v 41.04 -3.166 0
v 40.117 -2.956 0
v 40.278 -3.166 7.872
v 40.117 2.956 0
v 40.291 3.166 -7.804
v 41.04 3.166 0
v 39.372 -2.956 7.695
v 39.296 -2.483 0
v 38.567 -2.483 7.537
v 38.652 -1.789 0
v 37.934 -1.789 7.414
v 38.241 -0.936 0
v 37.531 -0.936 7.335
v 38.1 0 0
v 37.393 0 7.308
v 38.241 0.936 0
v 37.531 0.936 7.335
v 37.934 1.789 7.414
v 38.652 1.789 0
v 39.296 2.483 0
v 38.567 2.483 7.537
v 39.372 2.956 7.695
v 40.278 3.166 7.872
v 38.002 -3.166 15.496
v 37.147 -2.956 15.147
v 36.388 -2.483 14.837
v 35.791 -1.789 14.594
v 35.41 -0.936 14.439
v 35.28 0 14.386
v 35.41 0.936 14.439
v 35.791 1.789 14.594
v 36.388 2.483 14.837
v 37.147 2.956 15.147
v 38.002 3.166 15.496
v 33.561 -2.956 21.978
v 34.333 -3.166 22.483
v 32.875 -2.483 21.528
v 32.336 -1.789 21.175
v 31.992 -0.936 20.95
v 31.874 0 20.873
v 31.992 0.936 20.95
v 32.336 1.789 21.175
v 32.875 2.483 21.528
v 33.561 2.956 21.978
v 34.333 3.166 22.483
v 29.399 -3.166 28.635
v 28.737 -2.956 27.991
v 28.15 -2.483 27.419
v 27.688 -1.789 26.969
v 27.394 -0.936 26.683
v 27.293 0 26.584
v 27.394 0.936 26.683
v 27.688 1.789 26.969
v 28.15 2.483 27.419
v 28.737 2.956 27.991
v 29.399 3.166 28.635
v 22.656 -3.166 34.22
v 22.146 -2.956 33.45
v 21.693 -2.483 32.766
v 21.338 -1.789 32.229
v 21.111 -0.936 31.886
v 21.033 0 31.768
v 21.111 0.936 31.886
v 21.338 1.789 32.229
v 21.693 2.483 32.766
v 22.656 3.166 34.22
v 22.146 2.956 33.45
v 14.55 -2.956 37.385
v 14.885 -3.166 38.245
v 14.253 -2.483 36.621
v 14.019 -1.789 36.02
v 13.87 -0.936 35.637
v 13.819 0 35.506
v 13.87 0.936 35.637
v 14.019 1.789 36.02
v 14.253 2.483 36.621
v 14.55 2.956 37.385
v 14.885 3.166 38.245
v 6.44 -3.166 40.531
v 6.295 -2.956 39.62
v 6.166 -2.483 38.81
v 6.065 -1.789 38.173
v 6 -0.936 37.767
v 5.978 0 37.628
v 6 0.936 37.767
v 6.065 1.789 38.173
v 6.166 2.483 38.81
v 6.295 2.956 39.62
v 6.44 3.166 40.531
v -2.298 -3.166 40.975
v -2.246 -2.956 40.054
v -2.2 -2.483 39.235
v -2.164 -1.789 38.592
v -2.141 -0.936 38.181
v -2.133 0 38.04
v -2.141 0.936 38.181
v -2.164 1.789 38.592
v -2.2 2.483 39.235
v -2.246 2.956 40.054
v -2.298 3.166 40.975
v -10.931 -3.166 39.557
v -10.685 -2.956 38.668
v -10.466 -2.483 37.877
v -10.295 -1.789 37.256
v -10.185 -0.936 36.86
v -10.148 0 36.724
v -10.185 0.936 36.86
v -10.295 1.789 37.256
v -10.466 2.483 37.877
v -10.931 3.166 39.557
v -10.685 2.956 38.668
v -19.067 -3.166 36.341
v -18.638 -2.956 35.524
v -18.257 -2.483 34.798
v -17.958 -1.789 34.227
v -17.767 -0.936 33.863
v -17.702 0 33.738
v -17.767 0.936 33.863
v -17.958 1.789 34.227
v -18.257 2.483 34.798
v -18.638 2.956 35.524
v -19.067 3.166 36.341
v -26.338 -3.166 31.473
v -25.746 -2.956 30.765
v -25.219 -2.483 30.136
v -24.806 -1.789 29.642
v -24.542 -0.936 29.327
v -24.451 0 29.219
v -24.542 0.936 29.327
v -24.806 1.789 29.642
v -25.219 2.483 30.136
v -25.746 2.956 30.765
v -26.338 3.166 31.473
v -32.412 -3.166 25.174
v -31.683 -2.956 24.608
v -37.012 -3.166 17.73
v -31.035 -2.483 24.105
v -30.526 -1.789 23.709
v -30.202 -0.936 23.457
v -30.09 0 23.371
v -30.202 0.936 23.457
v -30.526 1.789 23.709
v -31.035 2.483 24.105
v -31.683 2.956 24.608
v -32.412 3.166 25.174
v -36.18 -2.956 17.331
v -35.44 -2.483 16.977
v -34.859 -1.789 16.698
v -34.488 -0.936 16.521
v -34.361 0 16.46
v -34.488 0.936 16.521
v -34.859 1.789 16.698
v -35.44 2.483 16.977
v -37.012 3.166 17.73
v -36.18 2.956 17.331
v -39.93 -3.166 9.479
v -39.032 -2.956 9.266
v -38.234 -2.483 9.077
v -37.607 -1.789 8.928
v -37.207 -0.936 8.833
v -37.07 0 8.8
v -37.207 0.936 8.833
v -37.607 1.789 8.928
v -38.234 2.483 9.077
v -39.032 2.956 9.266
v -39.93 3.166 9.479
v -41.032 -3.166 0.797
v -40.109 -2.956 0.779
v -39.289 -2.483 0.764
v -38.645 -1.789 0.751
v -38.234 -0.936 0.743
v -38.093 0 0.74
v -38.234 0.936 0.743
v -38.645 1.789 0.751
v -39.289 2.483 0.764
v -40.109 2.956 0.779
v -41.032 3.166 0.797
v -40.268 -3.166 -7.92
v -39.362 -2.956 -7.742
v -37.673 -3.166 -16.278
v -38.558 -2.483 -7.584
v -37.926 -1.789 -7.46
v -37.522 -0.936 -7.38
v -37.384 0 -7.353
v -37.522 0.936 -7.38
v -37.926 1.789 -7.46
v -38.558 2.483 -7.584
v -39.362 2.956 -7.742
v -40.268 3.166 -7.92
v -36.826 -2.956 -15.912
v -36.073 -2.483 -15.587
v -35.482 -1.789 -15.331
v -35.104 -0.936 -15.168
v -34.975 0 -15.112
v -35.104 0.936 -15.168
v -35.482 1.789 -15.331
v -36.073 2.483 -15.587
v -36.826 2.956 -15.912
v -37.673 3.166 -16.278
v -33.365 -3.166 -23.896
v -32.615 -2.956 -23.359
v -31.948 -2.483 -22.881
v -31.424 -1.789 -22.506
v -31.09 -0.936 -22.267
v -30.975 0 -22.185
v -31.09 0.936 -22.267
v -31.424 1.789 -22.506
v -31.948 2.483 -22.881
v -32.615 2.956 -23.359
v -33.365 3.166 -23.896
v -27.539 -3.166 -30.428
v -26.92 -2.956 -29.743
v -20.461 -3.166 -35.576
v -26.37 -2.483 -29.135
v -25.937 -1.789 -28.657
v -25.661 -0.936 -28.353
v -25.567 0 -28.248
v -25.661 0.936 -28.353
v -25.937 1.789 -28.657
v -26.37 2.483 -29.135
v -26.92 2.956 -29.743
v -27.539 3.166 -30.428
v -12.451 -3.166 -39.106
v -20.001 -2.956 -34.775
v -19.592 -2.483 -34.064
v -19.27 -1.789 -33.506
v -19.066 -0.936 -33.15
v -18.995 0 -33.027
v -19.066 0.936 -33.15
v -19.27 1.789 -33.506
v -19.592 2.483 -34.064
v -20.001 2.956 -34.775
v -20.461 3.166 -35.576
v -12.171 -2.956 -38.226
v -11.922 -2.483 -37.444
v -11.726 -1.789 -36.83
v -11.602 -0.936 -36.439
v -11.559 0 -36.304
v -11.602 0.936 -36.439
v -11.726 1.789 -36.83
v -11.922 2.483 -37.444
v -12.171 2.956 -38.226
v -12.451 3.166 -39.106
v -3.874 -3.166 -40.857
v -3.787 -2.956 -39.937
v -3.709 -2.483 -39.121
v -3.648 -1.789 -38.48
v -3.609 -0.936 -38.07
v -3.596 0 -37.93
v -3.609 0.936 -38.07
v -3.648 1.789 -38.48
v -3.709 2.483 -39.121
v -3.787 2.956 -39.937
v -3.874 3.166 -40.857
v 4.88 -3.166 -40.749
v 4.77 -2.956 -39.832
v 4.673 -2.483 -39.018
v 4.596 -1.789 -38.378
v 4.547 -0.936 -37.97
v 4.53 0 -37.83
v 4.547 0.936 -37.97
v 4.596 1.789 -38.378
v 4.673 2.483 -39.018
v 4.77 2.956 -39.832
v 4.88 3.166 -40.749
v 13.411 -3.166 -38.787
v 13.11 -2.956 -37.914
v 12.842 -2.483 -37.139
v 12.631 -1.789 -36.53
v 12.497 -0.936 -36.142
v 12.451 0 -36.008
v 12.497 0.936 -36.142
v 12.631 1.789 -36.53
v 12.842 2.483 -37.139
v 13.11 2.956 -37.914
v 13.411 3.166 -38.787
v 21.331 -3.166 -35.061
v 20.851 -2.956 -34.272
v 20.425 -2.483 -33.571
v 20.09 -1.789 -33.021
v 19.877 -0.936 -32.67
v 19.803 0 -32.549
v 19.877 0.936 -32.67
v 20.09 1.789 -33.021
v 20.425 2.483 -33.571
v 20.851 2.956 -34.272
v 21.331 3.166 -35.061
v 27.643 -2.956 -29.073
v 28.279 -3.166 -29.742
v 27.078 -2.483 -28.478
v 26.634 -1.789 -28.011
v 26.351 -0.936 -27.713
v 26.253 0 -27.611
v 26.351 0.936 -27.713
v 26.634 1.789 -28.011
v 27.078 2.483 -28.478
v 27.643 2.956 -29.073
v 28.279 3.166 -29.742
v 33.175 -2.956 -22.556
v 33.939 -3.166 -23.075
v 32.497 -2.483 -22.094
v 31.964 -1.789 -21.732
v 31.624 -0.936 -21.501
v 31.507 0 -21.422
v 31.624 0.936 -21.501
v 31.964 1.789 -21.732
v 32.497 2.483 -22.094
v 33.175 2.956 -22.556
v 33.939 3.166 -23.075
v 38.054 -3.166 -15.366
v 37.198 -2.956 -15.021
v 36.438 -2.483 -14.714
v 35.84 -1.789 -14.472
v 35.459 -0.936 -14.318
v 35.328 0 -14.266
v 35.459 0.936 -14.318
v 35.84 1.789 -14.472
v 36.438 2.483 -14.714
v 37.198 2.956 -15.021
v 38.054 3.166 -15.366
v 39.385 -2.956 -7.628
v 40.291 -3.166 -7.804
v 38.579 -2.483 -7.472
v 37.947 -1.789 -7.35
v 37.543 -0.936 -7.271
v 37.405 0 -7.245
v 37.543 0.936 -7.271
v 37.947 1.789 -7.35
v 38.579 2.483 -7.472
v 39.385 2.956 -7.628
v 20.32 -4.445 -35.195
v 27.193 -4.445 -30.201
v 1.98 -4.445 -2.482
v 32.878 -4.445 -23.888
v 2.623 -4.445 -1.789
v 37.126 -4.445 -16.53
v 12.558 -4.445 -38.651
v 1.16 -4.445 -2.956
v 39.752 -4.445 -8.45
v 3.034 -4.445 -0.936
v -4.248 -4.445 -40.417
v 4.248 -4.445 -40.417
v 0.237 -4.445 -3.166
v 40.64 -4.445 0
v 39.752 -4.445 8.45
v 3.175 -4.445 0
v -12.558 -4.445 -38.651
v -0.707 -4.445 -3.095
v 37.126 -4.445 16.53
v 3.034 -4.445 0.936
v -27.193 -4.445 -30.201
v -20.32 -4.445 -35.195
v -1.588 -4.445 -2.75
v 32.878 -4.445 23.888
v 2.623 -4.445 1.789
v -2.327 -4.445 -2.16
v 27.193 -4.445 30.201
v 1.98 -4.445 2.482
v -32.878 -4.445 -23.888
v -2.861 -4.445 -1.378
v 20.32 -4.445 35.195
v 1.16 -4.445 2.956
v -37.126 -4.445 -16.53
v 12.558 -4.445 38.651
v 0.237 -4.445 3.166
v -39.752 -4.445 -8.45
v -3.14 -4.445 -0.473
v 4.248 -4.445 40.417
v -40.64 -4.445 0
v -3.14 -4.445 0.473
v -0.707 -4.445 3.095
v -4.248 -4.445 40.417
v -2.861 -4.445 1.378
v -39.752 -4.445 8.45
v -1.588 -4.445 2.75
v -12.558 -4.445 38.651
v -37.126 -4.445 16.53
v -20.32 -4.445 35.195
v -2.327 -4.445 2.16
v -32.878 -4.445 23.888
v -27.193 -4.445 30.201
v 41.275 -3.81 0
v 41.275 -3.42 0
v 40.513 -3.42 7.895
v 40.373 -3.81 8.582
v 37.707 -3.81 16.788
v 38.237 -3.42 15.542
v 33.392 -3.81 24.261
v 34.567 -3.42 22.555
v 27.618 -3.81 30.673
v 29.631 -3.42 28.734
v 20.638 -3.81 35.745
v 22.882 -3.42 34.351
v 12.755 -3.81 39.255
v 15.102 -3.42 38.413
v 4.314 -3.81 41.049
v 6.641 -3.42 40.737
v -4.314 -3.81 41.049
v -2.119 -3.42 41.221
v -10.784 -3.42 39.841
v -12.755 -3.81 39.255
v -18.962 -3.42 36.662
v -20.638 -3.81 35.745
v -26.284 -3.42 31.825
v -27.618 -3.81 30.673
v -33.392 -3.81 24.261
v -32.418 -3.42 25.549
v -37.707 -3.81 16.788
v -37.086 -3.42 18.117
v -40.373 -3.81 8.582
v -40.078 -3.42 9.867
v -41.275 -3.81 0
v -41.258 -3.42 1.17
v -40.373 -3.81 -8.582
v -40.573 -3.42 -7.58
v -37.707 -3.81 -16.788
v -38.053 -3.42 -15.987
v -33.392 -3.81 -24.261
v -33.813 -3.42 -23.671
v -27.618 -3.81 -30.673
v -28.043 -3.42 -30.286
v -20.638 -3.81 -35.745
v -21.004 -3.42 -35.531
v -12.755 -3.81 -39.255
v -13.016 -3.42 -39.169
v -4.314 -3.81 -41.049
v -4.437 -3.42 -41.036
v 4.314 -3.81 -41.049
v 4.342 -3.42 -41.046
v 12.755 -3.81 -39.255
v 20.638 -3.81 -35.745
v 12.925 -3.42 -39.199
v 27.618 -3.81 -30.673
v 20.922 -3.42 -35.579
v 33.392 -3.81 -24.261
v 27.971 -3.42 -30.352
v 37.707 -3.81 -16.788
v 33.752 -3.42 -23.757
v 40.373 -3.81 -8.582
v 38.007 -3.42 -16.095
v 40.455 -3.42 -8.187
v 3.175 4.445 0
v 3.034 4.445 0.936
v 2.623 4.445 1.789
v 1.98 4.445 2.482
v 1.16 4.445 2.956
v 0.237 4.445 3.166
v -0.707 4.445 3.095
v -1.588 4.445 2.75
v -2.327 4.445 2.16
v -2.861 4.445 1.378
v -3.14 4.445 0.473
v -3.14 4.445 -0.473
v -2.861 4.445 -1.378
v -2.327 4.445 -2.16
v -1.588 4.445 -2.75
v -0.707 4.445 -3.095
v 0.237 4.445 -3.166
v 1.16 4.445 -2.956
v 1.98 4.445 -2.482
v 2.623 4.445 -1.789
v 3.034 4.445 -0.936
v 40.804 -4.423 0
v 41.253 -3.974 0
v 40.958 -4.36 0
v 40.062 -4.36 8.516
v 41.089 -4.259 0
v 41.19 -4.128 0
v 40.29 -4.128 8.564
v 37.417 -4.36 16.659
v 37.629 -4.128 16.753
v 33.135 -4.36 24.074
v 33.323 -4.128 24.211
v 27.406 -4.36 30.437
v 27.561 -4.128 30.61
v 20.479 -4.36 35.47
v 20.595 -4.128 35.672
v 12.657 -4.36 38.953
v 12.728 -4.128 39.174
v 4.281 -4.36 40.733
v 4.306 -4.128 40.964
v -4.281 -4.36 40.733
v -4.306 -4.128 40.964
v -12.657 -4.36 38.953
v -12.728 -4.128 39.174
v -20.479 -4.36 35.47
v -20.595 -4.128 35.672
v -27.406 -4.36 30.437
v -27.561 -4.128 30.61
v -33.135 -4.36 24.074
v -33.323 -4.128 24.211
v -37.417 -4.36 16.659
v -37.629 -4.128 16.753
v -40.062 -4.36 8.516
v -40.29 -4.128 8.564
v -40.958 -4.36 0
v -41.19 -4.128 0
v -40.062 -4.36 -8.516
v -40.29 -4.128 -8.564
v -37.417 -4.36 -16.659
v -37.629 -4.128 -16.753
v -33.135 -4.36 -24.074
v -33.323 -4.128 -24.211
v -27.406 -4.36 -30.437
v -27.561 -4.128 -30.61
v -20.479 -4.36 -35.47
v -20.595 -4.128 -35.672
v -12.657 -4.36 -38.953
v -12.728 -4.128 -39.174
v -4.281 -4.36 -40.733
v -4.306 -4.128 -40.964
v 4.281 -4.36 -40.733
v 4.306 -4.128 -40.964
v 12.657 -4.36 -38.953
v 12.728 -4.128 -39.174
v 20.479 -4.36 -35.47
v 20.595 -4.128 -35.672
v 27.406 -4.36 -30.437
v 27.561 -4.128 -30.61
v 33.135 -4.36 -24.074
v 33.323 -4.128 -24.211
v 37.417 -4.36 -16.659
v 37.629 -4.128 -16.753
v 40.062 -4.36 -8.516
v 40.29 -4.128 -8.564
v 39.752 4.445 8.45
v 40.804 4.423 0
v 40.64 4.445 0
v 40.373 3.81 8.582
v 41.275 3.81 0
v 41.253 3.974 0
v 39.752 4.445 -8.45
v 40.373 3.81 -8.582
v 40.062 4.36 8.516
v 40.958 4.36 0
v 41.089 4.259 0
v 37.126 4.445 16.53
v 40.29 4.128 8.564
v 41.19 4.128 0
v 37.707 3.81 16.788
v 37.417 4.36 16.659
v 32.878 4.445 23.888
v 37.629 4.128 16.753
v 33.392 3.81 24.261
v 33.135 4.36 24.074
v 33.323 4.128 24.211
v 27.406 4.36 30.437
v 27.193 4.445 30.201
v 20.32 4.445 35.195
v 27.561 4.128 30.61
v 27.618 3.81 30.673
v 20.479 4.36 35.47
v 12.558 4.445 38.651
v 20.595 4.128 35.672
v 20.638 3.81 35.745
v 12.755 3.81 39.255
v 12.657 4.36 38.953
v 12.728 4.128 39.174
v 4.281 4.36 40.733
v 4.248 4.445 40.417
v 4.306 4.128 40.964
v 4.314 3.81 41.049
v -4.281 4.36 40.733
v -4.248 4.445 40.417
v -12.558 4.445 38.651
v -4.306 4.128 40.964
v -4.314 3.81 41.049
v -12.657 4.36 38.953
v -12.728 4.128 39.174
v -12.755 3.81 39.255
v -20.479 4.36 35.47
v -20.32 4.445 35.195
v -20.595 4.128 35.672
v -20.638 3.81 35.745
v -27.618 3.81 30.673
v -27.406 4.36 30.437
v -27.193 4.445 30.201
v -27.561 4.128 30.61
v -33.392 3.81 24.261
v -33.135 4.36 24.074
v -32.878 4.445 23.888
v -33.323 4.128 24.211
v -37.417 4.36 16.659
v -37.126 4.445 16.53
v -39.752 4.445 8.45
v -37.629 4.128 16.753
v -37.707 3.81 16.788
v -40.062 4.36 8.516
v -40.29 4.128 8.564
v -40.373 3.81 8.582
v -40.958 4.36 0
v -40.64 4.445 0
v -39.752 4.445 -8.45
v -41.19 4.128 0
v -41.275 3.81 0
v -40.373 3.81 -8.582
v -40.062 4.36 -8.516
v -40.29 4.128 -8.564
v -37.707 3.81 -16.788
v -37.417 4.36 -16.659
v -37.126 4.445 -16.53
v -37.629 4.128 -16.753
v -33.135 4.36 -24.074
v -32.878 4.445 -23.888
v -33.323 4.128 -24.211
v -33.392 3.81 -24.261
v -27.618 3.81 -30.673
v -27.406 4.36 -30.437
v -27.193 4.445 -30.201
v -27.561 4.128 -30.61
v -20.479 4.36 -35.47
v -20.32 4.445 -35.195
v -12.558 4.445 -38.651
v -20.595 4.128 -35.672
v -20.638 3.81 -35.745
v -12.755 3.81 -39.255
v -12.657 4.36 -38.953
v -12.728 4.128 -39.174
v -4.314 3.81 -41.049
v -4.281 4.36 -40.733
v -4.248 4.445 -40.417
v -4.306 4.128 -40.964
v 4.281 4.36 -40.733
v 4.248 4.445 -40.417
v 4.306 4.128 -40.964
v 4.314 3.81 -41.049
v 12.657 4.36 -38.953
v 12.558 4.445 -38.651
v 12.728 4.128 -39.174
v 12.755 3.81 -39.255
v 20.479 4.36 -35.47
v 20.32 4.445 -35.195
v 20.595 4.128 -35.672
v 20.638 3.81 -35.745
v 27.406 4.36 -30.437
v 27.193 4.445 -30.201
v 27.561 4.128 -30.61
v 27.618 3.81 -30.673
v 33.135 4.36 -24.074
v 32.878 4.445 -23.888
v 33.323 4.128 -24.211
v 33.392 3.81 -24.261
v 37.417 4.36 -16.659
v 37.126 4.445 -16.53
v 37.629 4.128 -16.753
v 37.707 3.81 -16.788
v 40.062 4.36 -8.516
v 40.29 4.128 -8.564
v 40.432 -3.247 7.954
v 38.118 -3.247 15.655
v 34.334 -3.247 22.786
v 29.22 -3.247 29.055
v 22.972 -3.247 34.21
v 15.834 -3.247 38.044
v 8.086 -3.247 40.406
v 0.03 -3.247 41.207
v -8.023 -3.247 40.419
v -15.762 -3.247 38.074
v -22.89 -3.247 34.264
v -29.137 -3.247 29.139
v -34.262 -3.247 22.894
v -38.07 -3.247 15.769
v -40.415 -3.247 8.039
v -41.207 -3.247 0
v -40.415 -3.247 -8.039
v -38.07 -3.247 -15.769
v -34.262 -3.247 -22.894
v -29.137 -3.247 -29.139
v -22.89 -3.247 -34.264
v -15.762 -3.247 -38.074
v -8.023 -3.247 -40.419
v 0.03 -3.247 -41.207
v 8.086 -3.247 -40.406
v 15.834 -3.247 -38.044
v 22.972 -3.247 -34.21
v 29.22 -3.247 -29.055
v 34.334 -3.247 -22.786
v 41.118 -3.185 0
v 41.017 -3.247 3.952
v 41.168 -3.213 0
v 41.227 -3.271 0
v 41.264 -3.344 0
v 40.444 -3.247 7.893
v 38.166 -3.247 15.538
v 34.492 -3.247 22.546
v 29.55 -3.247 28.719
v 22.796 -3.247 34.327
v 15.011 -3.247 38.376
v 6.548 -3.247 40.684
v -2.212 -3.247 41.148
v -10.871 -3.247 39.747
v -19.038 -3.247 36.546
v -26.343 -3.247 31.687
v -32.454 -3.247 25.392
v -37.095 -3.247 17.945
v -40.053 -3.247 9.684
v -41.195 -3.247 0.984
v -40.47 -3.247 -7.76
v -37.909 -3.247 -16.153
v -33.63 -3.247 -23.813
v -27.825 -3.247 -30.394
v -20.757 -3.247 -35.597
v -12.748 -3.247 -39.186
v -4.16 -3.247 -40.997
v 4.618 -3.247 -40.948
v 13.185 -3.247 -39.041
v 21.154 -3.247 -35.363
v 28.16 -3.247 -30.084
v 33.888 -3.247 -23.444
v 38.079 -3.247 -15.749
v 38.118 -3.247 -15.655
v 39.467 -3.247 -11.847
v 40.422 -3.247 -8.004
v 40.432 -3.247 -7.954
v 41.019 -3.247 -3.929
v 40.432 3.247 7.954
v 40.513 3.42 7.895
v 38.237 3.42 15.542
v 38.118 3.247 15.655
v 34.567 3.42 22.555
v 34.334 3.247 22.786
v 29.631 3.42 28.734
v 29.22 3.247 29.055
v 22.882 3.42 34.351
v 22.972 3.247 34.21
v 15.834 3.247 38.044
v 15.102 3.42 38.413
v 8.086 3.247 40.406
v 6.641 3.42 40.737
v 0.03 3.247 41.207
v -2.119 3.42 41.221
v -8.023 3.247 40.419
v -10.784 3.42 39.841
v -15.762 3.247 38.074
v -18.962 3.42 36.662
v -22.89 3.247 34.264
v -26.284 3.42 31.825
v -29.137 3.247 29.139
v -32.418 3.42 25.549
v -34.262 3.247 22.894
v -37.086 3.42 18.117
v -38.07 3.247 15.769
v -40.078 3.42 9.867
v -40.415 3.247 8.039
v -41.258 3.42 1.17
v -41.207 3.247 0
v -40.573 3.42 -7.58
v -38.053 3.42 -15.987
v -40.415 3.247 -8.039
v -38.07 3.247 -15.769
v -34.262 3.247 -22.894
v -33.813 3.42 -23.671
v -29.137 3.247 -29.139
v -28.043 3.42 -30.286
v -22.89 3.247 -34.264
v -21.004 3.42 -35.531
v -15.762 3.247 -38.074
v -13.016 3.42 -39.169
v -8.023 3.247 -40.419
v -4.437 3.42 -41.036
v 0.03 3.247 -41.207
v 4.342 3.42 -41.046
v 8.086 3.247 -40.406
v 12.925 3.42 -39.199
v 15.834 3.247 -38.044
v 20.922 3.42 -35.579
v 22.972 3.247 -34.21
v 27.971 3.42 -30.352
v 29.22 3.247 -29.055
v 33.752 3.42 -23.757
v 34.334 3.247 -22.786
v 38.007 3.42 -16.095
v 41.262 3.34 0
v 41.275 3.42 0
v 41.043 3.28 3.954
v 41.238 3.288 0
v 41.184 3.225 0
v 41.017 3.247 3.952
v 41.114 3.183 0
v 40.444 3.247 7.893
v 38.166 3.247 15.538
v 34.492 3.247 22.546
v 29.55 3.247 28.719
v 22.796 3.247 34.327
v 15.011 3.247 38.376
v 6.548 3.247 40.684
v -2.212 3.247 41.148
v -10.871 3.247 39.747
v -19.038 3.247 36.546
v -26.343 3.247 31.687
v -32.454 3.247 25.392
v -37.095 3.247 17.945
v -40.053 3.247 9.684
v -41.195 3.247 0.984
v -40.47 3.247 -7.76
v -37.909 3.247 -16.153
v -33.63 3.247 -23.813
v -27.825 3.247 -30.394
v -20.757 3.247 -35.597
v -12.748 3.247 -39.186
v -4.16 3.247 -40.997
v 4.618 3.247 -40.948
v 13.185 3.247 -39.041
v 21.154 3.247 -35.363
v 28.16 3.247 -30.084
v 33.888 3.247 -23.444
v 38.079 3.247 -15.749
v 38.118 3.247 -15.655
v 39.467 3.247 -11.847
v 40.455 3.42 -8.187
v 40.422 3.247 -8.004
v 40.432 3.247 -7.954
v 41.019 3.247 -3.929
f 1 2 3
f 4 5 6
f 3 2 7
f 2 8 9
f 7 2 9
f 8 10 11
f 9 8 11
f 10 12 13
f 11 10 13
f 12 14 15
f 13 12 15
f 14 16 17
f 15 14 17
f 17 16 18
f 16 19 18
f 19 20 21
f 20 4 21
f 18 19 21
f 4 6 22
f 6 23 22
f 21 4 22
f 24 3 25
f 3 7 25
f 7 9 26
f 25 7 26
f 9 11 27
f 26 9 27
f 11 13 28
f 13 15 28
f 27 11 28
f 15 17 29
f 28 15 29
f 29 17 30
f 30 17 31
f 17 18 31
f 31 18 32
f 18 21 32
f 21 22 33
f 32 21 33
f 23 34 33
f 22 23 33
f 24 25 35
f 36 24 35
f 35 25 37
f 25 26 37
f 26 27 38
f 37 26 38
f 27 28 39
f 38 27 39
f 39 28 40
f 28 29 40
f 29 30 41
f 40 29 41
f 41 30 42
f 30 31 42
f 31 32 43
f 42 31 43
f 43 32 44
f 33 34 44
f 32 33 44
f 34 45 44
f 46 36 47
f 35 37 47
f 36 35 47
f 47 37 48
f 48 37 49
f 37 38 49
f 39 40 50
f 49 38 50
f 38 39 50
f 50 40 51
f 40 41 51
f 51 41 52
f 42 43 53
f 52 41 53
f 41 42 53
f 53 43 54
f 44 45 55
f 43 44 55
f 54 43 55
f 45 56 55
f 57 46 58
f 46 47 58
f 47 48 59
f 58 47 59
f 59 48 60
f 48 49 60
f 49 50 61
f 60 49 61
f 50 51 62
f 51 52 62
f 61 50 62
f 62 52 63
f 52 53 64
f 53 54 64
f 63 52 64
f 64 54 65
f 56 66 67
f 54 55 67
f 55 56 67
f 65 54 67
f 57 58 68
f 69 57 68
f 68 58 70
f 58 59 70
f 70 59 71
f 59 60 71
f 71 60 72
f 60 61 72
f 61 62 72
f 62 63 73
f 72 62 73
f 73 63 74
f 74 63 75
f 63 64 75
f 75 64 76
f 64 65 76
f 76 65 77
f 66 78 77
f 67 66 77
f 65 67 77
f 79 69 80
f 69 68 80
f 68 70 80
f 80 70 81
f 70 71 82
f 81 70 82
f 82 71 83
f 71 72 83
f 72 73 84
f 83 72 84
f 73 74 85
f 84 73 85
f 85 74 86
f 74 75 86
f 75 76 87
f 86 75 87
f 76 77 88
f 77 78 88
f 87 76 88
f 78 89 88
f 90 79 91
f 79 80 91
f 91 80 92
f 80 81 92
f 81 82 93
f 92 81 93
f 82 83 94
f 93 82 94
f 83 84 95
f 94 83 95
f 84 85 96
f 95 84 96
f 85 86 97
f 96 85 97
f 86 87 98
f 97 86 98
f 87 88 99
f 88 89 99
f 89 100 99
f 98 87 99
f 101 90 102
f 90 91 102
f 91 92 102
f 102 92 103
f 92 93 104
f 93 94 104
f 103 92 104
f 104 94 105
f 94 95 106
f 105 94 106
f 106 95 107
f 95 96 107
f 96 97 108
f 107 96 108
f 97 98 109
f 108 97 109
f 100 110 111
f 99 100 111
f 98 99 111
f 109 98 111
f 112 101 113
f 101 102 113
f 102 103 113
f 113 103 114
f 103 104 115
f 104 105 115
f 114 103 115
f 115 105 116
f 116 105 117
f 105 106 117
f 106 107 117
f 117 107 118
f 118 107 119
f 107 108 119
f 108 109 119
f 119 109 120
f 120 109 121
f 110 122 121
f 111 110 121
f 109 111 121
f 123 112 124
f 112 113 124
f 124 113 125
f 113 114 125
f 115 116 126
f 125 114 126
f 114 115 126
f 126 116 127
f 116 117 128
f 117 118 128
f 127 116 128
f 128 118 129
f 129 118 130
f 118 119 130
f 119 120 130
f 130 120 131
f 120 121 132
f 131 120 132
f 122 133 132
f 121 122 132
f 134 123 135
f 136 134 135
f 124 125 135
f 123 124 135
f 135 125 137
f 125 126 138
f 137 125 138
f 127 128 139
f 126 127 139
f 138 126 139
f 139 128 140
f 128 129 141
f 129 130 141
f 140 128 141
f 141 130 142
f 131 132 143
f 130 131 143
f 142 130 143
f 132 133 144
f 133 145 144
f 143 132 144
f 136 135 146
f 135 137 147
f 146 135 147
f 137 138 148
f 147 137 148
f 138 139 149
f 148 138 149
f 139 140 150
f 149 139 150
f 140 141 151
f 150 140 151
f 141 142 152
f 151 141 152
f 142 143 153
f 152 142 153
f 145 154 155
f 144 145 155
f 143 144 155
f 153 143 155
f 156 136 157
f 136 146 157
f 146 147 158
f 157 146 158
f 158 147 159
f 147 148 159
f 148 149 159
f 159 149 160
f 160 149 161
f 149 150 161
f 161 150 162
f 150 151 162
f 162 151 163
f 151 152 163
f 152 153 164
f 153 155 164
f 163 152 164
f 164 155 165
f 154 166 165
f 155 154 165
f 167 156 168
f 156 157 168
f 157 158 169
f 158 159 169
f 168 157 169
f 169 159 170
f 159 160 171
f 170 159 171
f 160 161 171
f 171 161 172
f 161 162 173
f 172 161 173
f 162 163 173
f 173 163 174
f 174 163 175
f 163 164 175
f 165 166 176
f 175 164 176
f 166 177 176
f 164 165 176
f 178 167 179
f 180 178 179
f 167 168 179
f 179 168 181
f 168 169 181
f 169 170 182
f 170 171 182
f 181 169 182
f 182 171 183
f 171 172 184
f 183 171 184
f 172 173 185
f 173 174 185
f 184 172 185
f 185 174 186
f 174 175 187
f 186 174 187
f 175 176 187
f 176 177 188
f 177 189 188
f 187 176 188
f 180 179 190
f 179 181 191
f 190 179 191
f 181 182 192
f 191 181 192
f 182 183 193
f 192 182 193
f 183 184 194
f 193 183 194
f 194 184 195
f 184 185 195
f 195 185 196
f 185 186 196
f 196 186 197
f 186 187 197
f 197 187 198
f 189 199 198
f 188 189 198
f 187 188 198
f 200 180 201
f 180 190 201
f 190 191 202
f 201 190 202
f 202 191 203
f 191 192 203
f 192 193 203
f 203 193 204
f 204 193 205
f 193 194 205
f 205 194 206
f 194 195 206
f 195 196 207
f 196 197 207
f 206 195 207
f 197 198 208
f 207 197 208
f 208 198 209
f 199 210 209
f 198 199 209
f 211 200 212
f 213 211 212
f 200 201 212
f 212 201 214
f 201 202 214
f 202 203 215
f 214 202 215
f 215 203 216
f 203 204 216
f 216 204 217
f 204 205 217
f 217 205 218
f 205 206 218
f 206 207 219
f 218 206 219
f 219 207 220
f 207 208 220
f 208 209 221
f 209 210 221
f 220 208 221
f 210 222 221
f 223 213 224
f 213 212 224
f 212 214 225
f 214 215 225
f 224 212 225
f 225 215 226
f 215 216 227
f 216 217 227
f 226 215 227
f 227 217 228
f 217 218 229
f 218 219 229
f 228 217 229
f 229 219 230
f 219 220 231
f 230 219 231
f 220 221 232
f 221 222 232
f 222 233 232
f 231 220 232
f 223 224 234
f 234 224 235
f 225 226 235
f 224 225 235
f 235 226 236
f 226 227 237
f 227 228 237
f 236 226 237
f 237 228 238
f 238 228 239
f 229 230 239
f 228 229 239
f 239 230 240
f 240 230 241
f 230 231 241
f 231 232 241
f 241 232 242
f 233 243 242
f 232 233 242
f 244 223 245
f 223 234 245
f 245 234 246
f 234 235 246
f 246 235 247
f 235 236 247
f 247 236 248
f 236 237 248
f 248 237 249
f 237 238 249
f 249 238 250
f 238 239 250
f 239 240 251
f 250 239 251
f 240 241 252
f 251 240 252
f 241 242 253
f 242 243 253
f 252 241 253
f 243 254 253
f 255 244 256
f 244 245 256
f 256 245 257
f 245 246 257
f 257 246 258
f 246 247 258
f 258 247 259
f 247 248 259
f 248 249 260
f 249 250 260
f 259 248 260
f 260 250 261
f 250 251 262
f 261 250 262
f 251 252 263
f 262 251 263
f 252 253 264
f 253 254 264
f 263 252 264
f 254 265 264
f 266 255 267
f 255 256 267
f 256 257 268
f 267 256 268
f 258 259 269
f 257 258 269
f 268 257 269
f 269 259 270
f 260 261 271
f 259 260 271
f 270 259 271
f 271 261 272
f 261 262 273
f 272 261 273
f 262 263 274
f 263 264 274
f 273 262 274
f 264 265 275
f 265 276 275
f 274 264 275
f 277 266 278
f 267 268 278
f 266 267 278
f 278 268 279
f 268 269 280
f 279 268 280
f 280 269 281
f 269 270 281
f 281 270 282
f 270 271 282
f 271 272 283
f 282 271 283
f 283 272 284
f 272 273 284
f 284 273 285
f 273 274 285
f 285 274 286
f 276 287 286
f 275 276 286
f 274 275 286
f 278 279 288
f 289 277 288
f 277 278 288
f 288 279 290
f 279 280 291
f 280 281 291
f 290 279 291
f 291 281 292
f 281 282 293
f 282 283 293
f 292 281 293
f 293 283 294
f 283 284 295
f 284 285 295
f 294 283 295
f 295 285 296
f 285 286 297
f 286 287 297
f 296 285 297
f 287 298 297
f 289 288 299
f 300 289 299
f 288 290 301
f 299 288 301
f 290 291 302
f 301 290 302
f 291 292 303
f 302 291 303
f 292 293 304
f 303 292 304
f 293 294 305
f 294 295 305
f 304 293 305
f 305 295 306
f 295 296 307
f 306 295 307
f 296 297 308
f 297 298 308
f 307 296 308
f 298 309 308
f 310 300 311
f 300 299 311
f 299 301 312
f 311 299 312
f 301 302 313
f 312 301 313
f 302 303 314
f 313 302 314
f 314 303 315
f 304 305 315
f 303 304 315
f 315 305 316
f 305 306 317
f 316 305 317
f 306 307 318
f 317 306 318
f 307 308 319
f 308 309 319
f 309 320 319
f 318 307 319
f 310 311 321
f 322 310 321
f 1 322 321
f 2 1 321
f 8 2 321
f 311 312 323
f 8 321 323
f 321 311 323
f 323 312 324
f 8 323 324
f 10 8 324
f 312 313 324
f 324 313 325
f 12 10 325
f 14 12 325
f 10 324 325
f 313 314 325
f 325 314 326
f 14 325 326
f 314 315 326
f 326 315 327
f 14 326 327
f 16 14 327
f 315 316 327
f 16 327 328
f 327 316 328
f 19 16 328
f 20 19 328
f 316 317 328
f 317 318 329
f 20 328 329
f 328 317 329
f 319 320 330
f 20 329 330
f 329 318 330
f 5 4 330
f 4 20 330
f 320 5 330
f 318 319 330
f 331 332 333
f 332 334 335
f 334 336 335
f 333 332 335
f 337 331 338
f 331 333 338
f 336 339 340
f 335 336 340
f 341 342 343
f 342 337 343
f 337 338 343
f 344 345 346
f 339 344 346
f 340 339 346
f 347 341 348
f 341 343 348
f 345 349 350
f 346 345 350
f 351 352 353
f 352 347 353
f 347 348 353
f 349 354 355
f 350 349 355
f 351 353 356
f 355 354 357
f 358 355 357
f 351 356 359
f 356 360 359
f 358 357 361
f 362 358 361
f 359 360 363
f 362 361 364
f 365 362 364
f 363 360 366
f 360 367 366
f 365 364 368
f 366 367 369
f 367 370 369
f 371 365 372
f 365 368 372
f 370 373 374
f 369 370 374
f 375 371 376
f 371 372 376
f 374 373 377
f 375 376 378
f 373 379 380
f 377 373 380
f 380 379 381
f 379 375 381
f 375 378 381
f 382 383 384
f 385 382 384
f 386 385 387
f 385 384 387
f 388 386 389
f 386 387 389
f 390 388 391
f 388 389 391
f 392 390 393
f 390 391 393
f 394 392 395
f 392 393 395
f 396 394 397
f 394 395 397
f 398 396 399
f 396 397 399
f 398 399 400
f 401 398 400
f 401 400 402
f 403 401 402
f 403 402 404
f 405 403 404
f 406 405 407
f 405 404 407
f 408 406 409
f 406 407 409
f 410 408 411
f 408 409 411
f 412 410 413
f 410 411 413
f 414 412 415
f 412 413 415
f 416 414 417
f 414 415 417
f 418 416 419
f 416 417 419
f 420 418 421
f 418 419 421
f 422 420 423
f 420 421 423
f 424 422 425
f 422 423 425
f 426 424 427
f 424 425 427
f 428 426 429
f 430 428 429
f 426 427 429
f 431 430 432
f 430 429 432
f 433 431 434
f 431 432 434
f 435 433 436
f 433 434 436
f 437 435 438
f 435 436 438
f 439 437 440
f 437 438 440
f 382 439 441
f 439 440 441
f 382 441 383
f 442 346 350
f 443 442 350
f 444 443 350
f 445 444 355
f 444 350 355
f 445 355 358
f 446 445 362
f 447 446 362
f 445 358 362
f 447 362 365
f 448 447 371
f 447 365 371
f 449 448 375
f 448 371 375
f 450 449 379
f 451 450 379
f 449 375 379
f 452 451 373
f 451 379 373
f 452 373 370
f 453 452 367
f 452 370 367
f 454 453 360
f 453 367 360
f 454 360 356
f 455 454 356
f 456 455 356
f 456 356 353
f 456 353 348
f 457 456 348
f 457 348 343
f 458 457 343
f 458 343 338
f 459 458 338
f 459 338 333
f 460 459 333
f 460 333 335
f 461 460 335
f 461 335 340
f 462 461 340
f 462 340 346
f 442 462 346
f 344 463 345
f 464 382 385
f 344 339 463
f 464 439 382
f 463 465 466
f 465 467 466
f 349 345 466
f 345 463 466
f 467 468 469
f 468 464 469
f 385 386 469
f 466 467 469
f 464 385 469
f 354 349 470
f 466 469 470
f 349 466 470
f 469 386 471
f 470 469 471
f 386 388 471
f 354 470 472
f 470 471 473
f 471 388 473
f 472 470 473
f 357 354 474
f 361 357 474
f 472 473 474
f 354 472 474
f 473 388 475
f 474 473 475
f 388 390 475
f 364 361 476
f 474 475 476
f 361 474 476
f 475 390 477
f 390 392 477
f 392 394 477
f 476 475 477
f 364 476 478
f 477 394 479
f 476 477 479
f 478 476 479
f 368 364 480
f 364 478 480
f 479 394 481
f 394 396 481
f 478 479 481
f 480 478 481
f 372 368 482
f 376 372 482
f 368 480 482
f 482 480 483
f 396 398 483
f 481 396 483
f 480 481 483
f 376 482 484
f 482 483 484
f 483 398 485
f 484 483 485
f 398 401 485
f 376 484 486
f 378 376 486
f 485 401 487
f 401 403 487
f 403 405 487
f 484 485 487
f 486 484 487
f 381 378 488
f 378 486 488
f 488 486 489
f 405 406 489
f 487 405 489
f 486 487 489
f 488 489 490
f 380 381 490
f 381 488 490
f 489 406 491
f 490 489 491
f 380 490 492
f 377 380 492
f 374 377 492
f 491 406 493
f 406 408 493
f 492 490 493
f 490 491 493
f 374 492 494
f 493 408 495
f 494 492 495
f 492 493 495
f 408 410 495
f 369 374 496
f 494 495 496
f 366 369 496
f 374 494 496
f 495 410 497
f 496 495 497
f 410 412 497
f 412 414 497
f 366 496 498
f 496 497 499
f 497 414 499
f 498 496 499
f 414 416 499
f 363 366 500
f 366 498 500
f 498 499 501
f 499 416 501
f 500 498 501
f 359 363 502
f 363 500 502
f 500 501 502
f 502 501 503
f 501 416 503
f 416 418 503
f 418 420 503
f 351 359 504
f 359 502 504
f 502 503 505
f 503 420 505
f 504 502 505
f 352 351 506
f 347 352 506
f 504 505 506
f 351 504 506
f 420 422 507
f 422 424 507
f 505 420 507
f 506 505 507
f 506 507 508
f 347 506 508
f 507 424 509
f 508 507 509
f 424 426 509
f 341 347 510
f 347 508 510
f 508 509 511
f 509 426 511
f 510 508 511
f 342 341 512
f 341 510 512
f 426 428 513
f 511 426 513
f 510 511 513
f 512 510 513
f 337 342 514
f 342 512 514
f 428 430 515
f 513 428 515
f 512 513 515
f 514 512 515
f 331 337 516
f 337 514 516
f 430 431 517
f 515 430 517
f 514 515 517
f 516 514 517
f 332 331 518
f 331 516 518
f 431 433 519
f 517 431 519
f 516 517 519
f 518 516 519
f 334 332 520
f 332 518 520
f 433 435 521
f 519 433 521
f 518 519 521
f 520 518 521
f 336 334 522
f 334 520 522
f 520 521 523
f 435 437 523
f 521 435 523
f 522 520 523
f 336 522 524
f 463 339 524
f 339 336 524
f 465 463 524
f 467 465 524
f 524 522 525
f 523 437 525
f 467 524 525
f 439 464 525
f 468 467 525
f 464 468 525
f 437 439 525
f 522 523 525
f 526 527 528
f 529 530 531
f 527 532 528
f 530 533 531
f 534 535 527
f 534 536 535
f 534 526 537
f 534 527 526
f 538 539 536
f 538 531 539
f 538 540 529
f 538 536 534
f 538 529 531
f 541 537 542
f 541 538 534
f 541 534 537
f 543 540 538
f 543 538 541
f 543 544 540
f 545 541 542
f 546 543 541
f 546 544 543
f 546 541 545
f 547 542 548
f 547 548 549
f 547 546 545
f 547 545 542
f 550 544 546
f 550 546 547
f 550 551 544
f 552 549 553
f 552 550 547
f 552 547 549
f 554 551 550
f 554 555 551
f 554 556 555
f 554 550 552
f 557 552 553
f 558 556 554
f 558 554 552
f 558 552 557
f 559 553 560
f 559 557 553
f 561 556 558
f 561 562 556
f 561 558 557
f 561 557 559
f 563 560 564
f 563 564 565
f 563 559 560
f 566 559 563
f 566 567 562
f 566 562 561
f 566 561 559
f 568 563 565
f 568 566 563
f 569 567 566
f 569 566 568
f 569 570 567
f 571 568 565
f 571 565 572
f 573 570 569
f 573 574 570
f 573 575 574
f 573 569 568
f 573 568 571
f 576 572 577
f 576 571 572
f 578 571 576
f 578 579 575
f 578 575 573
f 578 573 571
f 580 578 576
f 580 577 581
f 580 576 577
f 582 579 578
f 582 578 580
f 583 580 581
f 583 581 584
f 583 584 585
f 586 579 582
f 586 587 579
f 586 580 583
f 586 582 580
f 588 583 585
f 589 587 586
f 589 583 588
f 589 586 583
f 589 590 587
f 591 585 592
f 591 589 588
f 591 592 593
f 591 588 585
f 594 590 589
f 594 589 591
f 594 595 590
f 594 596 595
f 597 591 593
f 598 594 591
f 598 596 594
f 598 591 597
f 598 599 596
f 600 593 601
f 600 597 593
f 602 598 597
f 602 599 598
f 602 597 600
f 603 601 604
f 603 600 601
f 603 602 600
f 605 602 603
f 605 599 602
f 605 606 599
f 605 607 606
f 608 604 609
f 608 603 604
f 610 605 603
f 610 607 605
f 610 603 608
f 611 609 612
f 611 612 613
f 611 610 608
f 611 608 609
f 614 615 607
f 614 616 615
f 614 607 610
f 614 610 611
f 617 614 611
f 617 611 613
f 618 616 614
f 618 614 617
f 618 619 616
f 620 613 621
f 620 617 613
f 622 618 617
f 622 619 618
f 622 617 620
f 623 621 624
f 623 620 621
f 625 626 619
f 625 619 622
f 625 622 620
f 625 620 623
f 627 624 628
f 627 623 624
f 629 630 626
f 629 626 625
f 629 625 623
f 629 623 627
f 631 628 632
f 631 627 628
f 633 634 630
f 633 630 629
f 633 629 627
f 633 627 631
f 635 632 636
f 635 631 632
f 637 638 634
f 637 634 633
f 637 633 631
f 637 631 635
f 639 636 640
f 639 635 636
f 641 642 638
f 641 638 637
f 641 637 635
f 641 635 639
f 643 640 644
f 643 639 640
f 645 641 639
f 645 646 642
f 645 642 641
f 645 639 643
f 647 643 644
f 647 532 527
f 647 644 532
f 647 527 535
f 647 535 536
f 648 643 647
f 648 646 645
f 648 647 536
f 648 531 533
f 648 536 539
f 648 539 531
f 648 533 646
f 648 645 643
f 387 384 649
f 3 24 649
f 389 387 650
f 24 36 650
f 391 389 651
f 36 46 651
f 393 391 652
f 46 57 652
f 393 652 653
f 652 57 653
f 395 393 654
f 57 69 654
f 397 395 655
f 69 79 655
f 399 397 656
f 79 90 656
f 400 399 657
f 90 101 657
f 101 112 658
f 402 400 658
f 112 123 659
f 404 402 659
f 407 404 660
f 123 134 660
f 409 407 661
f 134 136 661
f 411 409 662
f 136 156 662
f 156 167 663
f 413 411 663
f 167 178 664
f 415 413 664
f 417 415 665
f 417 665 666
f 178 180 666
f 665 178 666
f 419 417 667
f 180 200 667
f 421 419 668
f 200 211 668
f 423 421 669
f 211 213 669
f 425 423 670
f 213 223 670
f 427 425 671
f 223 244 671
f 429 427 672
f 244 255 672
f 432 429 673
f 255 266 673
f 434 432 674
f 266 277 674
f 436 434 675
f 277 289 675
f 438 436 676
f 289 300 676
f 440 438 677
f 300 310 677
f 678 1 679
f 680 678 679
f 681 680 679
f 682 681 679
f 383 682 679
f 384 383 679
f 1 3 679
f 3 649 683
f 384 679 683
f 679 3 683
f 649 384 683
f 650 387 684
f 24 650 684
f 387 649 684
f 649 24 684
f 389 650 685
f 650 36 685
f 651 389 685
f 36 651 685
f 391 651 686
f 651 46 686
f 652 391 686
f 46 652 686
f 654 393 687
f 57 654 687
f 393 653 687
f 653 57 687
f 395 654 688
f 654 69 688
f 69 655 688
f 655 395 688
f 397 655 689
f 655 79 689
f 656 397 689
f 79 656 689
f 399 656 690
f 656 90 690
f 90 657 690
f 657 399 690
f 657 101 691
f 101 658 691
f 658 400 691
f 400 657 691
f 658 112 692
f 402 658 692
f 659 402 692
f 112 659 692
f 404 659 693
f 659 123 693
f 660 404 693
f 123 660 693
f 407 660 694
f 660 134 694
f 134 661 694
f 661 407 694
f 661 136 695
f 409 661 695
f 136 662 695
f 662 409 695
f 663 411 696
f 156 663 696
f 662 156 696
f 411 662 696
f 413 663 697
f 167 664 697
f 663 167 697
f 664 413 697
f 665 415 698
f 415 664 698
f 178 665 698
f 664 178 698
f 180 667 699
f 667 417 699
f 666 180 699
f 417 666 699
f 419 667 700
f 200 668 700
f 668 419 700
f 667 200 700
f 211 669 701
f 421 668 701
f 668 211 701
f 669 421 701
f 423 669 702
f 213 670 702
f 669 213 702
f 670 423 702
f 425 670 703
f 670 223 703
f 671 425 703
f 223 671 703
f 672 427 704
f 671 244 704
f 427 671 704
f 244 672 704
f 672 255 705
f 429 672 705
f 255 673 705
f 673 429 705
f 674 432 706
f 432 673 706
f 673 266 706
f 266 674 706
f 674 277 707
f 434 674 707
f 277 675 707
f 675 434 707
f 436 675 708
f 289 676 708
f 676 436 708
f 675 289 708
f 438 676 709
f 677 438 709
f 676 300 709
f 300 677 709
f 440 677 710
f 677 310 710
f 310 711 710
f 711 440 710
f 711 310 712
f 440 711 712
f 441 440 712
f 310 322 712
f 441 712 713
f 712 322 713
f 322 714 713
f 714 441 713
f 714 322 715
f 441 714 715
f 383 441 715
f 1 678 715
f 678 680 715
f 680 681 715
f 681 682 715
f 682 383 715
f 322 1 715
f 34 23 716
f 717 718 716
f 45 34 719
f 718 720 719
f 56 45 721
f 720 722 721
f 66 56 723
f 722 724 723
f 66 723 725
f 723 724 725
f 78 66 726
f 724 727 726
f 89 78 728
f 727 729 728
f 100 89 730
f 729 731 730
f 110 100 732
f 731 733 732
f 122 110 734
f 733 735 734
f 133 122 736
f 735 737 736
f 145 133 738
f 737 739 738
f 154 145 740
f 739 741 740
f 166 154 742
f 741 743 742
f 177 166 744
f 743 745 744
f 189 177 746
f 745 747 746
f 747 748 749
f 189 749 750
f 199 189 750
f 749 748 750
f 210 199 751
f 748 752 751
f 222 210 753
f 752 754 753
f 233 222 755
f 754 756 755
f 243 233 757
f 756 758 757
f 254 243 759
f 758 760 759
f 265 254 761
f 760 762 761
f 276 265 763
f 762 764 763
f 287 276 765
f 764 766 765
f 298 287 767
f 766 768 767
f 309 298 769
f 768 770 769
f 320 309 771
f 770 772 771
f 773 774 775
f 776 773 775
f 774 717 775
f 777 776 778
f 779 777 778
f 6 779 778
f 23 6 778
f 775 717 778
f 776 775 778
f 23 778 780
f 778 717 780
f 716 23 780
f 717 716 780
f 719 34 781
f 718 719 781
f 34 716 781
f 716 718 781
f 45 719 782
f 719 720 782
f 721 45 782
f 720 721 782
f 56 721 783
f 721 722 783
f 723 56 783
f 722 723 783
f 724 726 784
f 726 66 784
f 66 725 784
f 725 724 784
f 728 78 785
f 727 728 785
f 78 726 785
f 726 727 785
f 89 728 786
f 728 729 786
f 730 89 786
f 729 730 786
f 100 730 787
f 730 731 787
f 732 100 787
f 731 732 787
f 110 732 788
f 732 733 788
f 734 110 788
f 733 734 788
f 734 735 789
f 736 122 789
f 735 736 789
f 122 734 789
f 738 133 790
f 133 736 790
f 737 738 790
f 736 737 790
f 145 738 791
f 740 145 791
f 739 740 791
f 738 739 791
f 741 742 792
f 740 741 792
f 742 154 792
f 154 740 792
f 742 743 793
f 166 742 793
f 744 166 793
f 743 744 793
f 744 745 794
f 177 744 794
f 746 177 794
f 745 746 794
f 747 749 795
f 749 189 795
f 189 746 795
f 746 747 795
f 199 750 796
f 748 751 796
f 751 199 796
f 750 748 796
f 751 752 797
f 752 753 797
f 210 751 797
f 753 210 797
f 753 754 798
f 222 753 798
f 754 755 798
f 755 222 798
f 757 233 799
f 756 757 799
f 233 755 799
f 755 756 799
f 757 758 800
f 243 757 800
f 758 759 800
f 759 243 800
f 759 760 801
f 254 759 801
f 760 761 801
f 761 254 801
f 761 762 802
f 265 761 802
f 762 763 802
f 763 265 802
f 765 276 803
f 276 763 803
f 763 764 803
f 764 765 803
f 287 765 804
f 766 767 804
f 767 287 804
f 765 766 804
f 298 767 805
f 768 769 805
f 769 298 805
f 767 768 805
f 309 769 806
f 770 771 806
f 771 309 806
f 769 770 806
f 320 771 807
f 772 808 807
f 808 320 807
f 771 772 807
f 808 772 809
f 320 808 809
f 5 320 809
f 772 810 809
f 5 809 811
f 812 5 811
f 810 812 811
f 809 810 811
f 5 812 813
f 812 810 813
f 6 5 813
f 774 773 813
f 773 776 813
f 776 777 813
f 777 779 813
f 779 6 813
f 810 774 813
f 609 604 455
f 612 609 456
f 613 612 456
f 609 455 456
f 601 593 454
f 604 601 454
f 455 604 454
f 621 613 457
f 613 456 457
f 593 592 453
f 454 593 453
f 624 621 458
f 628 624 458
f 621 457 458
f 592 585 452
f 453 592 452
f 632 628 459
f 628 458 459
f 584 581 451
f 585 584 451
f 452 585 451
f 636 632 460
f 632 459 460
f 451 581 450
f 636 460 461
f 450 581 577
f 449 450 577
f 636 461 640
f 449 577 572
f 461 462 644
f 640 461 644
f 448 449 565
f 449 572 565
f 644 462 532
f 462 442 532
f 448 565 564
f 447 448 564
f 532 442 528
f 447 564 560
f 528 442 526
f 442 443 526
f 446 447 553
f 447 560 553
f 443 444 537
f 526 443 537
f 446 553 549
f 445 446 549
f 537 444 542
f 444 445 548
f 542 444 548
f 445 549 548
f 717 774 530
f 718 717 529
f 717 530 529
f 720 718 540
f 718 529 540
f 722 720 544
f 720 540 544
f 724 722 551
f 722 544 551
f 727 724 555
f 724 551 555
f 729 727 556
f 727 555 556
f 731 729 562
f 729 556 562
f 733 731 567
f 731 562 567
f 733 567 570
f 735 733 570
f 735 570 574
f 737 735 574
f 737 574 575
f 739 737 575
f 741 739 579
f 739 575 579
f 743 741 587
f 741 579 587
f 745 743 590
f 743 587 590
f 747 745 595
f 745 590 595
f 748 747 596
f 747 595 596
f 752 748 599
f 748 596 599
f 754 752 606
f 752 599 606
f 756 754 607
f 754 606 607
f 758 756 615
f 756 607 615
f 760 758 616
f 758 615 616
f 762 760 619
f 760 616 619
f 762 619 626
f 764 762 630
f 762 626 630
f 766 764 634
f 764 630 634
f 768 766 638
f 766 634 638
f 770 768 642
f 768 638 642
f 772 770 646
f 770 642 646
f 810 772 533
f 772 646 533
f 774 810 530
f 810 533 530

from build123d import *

# Parameters (mm, degrees)
F2_R     = 0.635
F3_R     = 0.254
F4_R     = 3.175
F5_DEPTH = 8.891


with BuildPart() as f1:
    # F0 (on Top) → F1 (revolve)
    with BuildSketch(Plane.XY):
        with BuildLine():
            Line((41.275, 4.445), (0, 4.445))
            Line((0, 4.445), (0, -4.445))
            Line((0, -4.445), (41.275, -4.445))
            Line((41.275, -4.445), (41.275, -3.175))
            ThreePointArc((41.275, -3.175), (38.1, 0), (41.275, 3.175))
            Line((41.275, 3.175), (41.275, 4.445))
        make_face()
    revolve(axis=Axis((0, 0, 0), (0, -1, 0)))

    # F2
    f2_edges = [f1.edges().sort_by_distance(p)[0] for p in [
        (-41.275, 4.445, 0),
        (-41.275, -4.445, 0),
    ]]
    fillet(f2_edges, radius=F2_R)

    # F3
    f3_edges = [f1.edges().sort_by_distance(p)[0] for p in [
        (-41.275, 3.175, 0),
        (-41.275, -3.175, 0),
    ]]
    fillet(f3_edges, radius=F3_R)

    # F4 (on face) → F5 (cut, through all)
    with BuildSketch(Plane.XZ.offset(4.445)):
        Circle(F4_R)
    extrude(amount=-F5_DEPTH, mode=Mode.SUBTRACT)


solid = f1.part
